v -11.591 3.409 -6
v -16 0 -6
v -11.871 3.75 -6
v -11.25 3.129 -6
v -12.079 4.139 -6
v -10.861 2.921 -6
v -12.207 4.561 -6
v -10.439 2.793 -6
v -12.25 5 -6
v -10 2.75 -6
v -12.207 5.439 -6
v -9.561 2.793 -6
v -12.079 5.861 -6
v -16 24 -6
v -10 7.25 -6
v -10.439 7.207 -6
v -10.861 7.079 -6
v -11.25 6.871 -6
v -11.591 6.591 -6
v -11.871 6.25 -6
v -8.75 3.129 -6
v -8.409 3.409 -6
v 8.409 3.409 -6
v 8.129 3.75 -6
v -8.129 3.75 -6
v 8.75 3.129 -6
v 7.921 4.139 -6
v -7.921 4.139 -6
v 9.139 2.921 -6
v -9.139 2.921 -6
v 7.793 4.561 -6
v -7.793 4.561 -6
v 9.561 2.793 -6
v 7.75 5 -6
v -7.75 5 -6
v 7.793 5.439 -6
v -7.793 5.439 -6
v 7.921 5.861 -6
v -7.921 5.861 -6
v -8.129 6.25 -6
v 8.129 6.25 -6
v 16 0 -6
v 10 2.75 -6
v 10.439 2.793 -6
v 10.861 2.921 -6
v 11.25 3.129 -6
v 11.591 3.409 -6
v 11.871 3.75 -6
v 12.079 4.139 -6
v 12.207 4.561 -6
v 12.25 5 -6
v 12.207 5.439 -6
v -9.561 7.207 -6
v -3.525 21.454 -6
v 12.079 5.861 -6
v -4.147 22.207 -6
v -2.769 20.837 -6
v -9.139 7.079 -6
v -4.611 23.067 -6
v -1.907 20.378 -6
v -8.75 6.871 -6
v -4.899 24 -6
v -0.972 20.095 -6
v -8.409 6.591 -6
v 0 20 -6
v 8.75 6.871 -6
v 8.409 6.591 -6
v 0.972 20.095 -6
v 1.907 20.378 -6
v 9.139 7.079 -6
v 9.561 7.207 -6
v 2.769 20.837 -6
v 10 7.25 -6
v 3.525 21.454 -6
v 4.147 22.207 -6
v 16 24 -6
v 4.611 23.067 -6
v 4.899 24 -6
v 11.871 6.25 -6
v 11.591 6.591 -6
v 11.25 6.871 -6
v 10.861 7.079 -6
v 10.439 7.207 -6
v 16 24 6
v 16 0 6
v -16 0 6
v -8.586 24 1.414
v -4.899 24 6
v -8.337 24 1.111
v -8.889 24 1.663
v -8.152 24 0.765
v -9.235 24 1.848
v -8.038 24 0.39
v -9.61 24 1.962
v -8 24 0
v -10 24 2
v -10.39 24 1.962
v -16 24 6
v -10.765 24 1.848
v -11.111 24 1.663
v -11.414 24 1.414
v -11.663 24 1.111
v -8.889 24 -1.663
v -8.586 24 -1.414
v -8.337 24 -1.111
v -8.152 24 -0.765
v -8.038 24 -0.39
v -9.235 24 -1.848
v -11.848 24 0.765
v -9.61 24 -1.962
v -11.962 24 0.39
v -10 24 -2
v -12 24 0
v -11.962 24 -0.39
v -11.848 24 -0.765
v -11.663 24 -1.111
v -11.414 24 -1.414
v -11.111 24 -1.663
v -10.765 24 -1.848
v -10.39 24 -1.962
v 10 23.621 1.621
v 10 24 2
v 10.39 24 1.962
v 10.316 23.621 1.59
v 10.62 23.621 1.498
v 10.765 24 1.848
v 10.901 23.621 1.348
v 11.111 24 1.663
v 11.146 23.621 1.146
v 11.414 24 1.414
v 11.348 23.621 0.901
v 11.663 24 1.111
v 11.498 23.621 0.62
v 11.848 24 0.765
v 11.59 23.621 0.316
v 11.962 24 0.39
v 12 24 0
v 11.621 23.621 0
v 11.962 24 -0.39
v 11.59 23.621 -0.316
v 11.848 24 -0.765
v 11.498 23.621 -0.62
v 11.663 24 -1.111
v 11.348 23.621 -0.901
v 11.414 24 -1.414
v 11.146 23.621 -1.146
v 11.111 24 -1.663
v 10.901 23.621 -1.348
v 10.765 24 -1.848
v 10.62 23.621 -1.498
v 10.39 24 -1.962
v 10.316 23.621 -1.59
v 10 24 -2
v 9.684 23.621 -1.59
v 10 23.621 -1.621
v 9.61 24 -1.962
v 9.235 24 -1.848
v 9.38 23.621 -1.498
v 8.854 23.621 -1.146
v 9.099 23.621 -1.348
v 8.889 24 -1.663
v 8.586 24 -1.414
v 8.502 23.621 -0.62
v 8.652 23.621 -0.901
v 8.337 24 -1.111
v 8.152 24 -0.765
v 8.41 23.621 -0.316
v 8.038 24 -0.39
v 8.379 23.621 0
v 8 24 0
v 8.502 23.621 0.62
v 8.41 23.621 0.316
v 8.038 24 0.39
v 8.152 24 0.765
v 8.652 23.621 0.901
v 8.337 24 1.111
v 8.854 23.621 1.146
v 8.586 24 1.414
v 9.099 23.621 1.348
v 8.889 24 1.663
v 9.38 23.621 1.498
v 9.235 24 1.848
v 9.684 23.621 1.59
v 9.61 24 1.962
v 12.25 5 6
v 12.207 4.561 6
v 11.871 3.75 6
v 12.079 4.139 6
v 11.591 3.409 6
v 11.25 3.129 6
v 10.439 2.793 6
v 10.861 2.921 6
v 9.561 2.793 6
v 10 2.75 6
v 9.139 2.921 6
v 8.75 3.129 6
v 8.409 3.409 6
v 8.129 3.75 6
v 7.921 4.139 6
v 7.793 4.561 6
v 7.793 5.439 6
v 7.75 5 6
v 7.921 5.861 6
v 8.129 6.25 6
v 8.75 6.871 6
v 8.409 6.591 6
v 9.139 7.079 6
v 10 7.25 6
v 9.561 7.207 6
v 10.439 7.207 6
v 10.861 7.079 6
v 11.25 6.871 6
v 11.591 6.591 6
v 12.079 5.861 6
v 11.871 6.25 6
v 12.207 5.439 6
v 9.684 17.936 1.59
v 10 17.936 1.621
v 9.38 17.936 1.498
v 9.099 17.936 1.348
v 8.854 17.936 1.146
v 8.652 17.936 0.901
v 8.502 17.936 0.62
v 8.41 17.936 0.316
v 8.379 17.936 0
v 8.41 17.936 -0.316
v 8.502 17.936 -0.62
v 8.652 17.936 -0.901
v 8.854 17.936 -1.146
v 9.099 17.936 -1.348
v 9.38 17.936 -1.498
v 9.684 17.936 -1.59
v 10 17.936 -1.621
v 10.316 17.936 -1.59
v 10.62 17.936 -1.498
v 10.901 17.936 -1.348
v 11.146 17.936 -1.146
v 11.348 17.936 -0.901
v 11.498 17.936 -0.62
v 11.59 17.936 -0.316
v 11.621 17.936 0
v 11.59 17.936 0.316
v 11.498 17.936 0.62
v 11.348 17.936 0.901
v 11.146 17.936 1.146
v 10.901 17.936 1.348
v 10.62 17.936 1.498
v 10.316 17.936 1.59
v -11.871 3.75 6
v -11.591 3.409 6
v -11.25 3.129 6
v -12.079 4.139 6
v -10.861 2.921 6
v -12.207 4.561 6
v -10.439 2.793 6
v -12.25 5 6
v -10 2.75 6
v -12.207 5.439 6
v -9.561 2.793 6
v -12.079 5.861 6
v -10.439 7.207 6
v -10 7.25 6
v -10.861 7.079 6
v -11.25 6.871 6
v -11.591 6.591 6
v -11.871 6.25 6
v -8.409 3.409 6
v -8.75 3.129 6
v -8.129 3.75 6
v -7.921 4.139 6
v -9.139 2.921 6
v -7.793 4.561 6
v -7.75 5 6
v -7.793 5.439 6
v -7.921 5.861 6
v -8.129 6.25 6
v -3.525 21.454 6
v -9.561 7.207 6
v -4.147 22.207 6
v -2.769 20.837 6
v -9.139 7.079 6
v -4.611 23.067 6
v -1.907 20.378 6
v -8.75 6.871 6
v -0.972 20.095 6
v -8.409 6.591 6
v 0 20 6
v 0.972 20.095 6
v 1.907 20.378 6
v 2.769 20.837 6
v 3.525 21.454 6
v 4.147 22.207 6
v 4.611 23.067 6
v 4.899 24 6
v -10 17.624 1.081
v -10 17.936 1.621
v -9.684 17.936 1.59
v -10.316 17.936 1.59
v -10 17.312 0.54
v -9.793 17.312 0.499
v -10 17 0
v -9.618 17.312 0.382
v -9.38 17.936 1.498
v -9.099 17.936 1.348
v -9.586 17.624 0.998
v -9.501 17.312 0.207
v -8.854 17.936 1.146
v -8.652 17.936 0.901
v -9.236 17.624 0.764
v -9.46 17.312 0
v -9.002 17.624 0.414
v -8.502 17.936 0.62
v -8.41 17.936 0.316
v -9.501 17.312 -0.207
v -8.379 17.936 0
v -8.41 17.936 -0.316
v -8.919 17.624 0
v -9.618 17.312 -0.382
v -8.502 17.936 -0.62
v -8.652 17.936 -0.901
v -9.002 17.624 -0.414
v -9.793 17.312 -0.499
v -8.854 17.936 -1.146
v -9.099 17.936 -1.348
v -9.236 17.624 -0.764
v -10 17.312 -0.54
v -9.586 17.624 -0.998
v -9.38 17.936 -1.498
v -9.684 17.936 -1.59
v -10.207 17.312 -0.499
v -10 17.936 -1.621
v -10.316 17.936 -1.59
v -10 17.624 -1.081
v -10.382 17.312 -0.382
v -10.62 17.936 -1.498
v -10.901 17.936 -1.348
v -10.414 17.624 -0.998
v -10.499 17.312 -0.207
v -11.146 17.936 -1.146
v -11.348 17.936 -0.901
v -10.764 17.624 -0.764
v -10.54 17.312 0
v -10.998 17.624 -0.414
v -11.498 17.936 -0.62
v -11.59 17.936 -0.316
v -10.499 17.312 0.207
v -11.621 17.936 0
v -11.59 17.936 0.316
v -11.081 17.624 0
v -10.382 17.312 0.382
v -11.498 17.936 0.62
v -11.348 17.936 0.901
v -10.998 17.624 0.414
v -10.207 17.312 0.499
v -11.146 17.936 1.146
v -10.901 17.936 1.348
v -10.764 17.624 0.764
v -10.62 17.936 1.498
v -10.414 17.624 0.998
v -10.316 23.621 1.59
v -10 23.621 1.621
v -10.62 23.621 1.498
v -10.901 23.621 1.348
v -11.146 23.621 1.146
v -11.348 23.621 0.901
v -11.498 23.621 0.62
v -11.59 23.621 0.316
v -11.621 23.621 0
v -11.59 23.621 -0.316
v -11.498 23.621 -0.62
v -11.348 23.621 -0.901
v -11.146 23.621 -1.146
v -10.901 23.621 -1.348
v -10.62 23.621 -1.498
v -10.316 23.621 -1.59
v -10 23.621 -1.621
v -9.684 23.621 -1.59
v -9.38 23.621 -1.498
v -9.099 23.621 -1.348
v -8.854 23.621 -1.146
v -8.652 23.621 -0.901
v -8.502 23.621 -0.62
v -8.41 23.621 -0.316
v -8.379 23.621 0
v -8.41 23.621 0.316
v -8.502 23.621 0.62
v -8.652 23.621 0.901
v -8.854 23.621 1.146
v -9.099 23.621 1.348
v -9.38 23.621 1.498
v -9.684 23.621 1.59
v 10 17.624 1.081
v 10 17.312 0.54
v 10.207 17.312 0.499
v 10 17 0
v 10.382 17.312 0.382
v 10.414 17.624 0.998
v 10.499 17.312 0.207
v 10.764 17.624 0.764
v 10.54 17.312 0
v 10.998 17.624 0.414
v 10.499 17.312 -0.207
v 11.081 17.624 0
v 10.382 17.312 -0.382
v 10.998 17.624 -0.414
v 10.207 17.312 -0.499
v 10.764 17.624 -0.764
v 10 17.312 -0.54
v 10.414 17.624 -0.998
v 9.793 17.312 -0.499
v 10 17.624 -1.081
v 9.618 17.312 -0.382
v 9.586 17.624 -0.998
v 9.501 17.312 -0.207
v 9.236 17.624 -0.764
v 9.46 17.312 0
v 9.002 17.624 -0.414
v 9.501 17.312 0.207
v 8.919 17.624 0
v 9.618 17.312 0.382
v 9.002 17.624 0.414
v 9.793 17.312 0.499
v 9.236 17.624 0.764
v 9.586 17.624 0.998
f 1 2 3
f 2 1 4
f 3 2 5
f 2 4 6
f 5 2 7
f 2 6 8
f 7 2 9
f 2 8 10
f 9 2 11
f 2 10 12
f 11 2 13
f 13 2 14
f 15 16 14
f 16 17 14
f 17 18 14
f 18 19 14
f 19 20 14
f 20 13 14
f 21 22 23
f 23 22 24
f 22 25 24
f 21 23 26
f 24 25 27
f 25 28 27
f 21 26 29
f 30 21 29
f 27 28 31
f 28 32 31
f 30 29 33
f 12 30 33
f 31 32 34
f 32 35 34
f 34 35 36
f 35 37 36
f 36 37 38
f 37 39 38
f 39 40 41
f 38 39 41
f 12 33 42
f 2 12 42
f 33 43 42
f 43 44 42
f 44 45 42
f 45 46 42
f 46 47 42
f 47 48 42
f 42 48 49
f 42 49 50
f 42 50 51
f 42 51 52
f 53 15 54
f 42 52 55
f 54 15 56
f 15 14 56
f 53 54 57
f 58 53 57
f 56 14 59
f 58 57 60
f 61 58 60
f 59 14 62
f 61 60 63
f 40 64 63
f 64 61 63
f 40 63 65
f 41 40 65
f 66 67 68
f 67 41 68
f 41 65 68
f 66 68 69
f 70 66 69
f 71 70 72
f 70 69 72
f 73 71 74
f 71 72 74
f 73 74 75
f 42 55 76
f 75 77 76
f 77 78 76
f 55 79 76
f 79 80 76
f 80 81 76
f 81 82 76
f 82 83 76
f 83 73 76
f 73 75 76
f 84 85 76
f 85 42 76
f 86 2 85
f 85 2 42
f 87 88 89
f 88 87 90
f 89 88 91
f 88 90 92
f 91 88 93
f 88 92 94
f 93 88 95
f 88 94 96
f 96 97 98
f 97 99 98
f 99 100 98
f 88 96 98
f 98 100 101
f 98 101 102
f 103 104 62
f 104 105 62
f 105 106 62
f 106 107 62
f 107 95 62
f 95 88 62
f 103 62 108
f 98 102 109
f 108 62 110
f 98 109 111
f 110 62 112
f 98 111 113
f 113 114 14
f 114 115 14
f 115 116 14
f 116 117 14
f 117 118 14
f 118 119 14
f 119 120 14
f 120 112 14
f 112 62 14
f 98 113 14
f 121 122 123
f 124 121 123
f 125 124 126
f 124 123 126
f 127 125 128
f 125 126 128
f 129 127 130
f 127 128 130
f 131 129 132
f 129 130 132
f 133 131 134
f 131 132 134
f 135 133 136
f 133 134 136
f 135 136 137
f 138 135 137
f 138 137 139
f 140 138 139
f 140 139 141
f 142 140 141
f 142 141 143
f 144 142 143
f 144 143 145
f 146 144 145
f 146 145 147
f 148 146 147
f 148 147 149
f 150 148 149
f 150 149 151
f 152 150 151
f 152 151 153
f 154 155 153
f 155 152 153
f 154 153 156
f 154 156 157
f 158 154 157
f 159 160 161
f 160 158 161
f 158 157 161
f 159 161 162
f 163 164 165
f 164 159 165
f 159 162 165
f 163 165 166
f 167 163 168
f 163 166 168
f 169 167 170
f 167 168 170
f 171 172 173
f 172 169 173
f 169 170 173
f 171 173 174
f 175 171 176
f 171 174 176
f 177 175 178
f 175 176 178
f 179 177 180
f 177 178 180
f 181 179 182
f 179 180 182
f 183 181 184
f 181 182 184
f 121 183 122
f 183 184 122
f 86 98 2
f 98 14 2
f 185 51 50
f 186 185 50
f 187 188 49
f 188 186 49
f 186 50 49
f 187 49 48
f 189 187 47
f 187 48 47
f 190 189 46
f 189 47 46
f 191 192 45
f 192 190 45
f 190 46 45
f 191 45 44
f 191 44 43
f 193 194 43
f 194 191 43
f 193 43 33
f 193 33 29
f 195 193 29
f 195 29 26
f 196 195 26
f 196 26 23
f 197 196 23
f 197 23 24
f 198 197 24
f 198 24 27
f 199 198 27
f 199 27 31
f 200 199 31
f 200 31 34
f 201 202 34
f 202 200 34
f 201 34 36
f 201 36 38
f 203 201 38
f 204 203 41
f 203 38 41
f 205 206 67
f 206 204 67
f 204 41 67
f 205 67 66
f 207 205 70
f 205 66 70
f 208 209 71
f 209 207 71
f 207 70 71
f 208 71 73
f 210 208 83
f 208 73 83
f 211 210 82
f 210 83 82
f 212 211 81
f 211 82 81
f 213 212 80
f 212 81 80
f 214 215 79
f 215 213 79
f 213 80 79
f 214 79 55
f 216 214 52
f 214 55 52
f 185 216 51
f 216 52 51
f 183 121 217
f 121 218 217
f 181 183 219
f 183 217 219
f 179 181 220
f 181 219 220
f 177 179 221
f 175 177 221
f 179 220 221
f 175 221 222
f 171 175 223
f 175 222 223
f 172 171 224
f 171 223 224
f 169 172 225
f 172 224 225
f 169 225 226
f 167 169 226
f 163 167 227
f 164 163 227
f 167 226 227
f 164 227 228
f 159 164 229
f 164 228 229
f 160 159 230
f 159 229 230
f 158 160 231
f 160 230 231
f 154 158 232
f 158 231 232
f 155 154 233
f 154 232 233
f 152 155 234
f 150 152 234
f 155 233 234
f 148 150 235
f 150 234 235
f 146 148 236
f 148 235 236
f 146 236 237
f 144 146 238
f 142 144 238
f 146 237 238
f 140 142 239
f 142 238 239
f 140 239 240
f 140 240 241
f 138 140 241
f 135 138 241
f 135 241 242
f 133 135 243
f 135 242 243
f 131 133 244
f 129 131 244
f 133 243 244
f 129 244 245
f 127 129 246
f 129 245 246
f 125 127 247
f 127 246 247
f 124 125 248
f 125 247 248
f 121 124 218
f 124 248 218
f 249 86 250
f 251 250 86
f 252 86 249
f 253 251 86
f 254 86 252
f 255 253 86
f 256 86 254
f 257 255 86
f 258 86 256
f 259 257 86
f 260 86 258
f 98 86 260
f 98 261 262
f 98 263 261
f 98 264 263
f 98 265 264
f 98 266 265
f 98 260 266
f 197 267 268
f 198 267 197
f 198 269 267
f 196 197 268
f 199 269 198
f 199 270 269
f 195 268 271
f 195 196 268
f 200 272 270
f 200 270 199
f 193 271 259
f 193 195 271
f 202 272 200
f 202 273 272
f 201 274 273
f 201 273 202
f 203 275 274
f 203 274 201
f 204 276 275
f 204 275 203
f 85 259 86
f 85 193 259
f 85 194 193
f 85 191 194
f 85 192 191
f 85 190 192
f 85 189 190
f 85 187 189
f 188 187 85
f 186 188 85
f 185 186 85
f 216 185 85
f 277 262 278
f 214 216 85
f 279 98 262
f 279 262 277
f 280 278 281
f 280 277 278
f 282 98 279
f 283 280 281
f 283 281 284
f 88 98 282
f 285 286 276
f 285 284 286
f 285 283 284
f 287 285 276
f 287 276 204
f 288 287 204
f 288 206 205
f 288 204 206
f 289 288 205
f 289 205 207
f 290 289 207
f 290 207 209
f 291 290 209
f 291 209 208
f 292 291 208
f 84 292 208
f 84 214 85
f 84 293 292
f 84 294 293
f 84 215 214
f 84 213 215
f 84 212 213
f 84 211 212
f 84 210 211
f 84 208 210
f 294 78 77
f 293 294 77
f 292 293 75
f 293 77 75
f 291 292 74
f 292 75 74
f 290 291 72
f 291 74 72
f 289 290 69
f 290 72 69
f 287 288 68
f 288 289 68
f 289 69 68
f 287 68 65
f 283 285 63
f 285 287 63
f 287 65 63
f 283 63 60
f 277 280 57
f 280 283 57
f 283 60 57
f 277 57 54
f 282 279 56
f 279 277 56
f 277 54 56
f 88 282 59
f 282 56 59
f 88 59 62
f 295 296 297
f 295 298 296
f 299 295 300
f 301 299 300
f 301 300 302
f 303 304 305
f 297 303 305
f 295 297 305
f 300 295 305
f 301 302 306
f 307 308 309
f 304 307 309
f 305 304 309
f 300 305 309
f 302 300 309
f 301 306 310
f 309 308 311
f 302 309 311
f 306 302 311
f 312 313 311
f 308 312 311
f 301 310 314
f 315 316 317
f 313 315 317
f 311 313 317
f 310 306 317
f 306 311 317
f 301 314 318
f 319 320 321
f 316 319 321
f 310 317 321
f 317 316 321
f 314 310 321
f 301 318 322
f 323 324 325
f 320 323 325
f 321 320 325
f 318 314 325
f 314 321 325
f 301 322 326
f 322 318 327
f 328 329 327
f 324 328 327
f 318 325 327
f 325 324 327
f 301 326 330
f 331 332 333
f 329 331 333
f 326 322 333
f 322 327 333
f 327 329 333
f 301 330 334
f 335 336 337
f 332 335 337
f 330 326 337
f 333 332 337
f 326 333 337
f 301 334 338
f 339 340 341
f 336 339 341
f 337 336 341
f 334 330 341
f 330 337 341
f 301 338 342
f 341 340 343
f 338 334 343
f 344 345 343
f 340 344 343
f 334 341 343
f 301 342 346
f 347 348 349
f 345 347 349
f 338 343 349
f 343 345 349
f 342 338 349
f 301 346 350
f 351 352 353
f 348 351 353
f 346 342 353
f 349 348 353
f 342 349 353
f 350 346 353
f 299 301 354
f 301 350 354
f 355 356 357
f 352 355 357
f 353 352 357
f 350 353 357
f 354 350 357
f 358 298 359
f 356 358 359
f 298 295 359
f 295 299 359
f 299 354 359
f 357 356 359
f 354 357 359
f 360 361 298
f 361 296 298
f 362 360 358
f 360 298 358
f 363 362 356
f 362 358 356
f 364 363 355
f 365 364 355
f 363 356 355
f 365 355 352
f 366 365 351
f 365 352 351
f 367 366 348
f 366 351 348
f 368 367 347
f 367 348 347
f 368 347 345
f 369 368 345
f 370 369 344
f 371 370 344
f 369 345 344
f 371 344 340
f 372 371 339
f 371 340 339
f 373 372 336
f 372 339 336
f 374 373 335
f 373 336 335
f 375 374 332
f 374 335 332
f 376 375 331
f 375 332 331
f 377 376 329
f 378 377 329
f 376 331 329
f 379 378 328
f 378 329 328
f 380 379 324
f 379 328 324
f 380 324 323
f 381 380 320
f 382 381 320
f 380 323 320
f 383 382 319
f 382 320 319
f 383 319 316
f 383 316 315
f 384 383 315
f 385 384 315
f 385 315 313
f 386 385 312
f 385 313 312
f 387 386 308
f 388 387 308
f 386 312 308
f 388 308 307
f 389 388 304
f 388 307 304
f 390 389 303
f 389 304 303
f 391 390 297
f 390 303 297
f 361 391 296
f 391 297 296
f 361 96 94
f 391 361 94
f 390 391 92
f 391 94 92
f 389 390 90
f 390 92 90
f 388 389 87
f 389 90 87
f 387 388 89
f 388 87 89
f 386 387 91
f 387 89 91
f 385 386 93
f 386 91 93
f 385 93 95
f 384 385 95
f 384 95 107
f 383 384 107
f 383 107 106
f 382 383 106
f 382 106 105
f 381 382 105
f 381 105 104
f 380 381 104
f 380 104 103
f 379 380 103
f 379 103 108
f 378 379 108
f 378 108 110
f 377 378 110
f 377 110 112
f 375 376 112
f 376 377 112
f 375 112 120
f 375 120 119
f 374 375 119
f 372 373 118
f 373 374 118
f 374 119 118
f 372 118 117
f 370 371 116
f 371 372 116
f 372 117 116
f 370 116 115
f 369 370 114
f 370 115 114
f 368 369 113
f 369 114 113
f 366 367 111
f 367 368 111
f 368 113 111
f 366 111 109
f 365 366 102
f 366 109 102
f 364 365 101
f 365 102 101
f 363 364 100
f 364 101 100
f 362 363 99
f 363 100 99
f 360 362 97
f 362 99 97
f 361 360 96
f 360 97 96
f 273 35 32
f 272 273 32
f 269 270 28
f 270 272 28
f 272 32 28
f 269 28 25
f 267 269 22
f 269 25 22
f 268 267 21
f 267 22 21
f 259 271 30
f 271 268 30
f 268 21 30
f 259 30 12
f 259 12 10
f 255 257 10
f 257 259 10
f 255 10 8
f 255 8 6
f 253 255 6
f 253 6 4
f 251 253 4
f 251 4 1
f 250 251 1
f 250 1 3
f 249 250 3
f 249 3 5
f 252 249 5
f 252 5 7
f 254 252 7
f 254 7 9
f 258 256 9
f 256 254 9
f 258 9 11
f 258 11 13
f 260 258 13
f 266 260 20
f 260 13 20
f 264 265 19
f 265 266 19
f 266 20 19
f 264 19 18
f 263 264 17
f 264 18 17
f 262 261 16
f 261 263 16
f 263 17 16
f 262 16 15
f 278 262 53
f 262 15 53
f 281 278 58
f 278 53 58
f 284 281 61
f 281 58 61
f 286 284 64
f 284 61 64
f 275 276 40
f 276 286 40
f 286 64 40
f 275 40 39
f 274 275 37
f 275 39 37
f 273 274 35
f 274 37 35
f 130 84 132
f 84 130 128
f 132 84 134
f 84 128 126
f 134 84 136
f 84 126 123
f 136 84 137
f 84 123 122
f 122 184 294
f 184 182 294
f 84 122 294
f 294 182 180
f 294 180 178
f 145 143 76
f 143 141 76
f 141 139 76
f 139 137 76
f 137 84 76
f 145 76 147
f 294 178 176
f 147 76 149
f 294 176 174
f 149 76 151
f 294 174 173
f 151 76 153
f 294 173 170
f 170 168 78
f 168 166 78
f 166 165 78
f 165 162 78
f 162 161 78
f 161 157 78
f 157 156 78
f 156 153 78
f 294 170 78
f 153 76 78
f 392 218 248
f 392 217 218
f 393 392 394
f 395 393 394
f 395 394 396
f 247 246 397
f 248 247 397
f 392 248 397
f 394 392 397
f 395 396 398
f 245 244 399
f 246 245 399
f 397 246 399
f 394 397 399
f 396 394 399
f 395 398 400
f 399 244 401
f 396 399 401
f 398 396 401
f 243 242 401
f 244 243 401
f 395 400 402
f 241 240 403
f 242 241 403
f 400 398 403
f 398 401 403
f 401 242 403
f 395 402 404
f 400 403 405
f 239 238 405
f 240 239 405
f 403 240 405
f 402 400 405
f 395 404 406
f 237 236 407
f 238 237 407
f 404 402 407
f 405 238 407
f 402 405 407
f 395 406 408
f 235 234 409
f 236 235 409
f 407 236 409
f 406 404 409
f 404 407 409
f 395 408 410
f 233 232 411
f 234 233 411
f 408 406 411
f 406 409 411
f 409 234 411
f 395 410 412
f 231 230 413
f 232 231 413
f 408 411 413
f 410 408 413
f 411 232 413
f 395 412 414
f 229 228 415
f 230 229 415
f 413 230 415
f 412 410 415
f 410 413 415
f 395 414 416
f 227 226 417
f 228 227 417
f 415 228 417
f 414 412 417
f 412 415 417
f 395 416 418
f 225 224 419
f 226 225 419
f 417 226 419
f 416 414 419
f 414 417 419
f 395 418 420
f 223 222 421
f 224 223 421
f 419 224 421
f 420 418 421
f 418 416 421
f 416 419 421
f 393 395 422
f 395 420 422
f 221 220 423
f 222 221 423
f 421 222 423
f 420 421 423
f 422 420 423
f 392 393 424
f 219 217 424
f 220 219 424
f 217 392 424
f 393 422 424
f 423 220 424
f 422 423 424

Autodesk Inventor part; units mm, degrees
sketch "Sketch_10" plane through (0, 0, 0) normal (0, 0, 1) x (1, 0, 0)
  line L0 (-16, 24) -> (-16, 0)
  line L1 (-16, 0) -> (16, 0)
  line L2 (16, 0) -> (16, 24)
  line L3 (16, 24) -> (4.899, 24)
  arc A0 (-4.899, 24) -> (4.899, 24) centre (0, 25) ccw
  line L4 (-4.899, 24) -> (-16, 24)
extrude "Extrusion1" add sketch "Sketch_10" along normal mid plane 12
sketch "Sketch2" plane through (4.899, 24, 6) normal (0, 1, 0) x (1, 0, 0)
  point P0 (5.101, 6)
hole "Hole1" at (10, 24, 0) direction (0, -1, 0) diameter 3.242 depth 6.0641 tip angle 120 countersink diameter 4 countersink angle 90 thread size "M4x0.7" class "6H" standard "ISO Metric profile"
sketch "Sketch3" plane through (-16, 24, 6) normal (0, 1, 0) x (1, 0, 0)
  point P0 (6, 6)
hole "Hole2" at (-10, 24, 0) direction (0, -1, 0) diameter 3.242 depth 6.0641 tip angle 120 countersink diameter 4 countersink angle 90 thread size "M4x0.7" class "6H" standard "ISO Metric profile"
sketch "Sketch_2" plane through (0, 0, 0) normal (0, 0, 1) x (1, 0, 0)
  circle A0 centre (10, 5) radius 2.25
extrude "Extrusion2" cut sketch "Sketch_2" along normal mid plane 12
sketch "Sketch_3" plane through (0, 0, 0) normal (0, 0, 1) x (1, 0, 0)
  circle A0 centre (-10, 5) radius 2.25
extrude "Extrusion3" cut sketch "Sketch_3" along normal mid plane 12
ref_plane "bolt2_to_body_XY" through (-10, 30.5, 0) normal (0, 1, 0) x (1, 0, 0)
ref_plane "bolt2_to_body_YZ" through (-10, 30.5, 0) normal (1, 0, 0) x (0, 0, -1)
ref_plane "bolt2_to_body_ZX" through (-10, 30.5, 0) normal (0, 0, -1) x (0, 1, 0)
ref_plane "bolt_to_body_XY" through (10, 30.5, 0) normal (0, 1, 0) x (1, 0, 0)
ref_plane "bolt_to_body_YZ" through (10, 30.5, 0) normal (1, 0, 0) x (0, 0, -1)
ref_plane "bolt_to_body_ZX" through (10, 30.5, 0) normal (0, 0, -1) x (0, 1, 0)
ref_plane "p_to_body_XY" through (0, 0, 0) normal (0, 1, 0) x (1, 0, 0)
ref_plane "p_to_body_YZ" through (0, 0, 0) normal (1, 0, 0) x (0, 0, -1)
ref_plane "p_to_body_ZX" through (0, 0, 0) normal (0, 0, -1) x (0, 1, 0)
properties part number "SHZA10-25_b"
